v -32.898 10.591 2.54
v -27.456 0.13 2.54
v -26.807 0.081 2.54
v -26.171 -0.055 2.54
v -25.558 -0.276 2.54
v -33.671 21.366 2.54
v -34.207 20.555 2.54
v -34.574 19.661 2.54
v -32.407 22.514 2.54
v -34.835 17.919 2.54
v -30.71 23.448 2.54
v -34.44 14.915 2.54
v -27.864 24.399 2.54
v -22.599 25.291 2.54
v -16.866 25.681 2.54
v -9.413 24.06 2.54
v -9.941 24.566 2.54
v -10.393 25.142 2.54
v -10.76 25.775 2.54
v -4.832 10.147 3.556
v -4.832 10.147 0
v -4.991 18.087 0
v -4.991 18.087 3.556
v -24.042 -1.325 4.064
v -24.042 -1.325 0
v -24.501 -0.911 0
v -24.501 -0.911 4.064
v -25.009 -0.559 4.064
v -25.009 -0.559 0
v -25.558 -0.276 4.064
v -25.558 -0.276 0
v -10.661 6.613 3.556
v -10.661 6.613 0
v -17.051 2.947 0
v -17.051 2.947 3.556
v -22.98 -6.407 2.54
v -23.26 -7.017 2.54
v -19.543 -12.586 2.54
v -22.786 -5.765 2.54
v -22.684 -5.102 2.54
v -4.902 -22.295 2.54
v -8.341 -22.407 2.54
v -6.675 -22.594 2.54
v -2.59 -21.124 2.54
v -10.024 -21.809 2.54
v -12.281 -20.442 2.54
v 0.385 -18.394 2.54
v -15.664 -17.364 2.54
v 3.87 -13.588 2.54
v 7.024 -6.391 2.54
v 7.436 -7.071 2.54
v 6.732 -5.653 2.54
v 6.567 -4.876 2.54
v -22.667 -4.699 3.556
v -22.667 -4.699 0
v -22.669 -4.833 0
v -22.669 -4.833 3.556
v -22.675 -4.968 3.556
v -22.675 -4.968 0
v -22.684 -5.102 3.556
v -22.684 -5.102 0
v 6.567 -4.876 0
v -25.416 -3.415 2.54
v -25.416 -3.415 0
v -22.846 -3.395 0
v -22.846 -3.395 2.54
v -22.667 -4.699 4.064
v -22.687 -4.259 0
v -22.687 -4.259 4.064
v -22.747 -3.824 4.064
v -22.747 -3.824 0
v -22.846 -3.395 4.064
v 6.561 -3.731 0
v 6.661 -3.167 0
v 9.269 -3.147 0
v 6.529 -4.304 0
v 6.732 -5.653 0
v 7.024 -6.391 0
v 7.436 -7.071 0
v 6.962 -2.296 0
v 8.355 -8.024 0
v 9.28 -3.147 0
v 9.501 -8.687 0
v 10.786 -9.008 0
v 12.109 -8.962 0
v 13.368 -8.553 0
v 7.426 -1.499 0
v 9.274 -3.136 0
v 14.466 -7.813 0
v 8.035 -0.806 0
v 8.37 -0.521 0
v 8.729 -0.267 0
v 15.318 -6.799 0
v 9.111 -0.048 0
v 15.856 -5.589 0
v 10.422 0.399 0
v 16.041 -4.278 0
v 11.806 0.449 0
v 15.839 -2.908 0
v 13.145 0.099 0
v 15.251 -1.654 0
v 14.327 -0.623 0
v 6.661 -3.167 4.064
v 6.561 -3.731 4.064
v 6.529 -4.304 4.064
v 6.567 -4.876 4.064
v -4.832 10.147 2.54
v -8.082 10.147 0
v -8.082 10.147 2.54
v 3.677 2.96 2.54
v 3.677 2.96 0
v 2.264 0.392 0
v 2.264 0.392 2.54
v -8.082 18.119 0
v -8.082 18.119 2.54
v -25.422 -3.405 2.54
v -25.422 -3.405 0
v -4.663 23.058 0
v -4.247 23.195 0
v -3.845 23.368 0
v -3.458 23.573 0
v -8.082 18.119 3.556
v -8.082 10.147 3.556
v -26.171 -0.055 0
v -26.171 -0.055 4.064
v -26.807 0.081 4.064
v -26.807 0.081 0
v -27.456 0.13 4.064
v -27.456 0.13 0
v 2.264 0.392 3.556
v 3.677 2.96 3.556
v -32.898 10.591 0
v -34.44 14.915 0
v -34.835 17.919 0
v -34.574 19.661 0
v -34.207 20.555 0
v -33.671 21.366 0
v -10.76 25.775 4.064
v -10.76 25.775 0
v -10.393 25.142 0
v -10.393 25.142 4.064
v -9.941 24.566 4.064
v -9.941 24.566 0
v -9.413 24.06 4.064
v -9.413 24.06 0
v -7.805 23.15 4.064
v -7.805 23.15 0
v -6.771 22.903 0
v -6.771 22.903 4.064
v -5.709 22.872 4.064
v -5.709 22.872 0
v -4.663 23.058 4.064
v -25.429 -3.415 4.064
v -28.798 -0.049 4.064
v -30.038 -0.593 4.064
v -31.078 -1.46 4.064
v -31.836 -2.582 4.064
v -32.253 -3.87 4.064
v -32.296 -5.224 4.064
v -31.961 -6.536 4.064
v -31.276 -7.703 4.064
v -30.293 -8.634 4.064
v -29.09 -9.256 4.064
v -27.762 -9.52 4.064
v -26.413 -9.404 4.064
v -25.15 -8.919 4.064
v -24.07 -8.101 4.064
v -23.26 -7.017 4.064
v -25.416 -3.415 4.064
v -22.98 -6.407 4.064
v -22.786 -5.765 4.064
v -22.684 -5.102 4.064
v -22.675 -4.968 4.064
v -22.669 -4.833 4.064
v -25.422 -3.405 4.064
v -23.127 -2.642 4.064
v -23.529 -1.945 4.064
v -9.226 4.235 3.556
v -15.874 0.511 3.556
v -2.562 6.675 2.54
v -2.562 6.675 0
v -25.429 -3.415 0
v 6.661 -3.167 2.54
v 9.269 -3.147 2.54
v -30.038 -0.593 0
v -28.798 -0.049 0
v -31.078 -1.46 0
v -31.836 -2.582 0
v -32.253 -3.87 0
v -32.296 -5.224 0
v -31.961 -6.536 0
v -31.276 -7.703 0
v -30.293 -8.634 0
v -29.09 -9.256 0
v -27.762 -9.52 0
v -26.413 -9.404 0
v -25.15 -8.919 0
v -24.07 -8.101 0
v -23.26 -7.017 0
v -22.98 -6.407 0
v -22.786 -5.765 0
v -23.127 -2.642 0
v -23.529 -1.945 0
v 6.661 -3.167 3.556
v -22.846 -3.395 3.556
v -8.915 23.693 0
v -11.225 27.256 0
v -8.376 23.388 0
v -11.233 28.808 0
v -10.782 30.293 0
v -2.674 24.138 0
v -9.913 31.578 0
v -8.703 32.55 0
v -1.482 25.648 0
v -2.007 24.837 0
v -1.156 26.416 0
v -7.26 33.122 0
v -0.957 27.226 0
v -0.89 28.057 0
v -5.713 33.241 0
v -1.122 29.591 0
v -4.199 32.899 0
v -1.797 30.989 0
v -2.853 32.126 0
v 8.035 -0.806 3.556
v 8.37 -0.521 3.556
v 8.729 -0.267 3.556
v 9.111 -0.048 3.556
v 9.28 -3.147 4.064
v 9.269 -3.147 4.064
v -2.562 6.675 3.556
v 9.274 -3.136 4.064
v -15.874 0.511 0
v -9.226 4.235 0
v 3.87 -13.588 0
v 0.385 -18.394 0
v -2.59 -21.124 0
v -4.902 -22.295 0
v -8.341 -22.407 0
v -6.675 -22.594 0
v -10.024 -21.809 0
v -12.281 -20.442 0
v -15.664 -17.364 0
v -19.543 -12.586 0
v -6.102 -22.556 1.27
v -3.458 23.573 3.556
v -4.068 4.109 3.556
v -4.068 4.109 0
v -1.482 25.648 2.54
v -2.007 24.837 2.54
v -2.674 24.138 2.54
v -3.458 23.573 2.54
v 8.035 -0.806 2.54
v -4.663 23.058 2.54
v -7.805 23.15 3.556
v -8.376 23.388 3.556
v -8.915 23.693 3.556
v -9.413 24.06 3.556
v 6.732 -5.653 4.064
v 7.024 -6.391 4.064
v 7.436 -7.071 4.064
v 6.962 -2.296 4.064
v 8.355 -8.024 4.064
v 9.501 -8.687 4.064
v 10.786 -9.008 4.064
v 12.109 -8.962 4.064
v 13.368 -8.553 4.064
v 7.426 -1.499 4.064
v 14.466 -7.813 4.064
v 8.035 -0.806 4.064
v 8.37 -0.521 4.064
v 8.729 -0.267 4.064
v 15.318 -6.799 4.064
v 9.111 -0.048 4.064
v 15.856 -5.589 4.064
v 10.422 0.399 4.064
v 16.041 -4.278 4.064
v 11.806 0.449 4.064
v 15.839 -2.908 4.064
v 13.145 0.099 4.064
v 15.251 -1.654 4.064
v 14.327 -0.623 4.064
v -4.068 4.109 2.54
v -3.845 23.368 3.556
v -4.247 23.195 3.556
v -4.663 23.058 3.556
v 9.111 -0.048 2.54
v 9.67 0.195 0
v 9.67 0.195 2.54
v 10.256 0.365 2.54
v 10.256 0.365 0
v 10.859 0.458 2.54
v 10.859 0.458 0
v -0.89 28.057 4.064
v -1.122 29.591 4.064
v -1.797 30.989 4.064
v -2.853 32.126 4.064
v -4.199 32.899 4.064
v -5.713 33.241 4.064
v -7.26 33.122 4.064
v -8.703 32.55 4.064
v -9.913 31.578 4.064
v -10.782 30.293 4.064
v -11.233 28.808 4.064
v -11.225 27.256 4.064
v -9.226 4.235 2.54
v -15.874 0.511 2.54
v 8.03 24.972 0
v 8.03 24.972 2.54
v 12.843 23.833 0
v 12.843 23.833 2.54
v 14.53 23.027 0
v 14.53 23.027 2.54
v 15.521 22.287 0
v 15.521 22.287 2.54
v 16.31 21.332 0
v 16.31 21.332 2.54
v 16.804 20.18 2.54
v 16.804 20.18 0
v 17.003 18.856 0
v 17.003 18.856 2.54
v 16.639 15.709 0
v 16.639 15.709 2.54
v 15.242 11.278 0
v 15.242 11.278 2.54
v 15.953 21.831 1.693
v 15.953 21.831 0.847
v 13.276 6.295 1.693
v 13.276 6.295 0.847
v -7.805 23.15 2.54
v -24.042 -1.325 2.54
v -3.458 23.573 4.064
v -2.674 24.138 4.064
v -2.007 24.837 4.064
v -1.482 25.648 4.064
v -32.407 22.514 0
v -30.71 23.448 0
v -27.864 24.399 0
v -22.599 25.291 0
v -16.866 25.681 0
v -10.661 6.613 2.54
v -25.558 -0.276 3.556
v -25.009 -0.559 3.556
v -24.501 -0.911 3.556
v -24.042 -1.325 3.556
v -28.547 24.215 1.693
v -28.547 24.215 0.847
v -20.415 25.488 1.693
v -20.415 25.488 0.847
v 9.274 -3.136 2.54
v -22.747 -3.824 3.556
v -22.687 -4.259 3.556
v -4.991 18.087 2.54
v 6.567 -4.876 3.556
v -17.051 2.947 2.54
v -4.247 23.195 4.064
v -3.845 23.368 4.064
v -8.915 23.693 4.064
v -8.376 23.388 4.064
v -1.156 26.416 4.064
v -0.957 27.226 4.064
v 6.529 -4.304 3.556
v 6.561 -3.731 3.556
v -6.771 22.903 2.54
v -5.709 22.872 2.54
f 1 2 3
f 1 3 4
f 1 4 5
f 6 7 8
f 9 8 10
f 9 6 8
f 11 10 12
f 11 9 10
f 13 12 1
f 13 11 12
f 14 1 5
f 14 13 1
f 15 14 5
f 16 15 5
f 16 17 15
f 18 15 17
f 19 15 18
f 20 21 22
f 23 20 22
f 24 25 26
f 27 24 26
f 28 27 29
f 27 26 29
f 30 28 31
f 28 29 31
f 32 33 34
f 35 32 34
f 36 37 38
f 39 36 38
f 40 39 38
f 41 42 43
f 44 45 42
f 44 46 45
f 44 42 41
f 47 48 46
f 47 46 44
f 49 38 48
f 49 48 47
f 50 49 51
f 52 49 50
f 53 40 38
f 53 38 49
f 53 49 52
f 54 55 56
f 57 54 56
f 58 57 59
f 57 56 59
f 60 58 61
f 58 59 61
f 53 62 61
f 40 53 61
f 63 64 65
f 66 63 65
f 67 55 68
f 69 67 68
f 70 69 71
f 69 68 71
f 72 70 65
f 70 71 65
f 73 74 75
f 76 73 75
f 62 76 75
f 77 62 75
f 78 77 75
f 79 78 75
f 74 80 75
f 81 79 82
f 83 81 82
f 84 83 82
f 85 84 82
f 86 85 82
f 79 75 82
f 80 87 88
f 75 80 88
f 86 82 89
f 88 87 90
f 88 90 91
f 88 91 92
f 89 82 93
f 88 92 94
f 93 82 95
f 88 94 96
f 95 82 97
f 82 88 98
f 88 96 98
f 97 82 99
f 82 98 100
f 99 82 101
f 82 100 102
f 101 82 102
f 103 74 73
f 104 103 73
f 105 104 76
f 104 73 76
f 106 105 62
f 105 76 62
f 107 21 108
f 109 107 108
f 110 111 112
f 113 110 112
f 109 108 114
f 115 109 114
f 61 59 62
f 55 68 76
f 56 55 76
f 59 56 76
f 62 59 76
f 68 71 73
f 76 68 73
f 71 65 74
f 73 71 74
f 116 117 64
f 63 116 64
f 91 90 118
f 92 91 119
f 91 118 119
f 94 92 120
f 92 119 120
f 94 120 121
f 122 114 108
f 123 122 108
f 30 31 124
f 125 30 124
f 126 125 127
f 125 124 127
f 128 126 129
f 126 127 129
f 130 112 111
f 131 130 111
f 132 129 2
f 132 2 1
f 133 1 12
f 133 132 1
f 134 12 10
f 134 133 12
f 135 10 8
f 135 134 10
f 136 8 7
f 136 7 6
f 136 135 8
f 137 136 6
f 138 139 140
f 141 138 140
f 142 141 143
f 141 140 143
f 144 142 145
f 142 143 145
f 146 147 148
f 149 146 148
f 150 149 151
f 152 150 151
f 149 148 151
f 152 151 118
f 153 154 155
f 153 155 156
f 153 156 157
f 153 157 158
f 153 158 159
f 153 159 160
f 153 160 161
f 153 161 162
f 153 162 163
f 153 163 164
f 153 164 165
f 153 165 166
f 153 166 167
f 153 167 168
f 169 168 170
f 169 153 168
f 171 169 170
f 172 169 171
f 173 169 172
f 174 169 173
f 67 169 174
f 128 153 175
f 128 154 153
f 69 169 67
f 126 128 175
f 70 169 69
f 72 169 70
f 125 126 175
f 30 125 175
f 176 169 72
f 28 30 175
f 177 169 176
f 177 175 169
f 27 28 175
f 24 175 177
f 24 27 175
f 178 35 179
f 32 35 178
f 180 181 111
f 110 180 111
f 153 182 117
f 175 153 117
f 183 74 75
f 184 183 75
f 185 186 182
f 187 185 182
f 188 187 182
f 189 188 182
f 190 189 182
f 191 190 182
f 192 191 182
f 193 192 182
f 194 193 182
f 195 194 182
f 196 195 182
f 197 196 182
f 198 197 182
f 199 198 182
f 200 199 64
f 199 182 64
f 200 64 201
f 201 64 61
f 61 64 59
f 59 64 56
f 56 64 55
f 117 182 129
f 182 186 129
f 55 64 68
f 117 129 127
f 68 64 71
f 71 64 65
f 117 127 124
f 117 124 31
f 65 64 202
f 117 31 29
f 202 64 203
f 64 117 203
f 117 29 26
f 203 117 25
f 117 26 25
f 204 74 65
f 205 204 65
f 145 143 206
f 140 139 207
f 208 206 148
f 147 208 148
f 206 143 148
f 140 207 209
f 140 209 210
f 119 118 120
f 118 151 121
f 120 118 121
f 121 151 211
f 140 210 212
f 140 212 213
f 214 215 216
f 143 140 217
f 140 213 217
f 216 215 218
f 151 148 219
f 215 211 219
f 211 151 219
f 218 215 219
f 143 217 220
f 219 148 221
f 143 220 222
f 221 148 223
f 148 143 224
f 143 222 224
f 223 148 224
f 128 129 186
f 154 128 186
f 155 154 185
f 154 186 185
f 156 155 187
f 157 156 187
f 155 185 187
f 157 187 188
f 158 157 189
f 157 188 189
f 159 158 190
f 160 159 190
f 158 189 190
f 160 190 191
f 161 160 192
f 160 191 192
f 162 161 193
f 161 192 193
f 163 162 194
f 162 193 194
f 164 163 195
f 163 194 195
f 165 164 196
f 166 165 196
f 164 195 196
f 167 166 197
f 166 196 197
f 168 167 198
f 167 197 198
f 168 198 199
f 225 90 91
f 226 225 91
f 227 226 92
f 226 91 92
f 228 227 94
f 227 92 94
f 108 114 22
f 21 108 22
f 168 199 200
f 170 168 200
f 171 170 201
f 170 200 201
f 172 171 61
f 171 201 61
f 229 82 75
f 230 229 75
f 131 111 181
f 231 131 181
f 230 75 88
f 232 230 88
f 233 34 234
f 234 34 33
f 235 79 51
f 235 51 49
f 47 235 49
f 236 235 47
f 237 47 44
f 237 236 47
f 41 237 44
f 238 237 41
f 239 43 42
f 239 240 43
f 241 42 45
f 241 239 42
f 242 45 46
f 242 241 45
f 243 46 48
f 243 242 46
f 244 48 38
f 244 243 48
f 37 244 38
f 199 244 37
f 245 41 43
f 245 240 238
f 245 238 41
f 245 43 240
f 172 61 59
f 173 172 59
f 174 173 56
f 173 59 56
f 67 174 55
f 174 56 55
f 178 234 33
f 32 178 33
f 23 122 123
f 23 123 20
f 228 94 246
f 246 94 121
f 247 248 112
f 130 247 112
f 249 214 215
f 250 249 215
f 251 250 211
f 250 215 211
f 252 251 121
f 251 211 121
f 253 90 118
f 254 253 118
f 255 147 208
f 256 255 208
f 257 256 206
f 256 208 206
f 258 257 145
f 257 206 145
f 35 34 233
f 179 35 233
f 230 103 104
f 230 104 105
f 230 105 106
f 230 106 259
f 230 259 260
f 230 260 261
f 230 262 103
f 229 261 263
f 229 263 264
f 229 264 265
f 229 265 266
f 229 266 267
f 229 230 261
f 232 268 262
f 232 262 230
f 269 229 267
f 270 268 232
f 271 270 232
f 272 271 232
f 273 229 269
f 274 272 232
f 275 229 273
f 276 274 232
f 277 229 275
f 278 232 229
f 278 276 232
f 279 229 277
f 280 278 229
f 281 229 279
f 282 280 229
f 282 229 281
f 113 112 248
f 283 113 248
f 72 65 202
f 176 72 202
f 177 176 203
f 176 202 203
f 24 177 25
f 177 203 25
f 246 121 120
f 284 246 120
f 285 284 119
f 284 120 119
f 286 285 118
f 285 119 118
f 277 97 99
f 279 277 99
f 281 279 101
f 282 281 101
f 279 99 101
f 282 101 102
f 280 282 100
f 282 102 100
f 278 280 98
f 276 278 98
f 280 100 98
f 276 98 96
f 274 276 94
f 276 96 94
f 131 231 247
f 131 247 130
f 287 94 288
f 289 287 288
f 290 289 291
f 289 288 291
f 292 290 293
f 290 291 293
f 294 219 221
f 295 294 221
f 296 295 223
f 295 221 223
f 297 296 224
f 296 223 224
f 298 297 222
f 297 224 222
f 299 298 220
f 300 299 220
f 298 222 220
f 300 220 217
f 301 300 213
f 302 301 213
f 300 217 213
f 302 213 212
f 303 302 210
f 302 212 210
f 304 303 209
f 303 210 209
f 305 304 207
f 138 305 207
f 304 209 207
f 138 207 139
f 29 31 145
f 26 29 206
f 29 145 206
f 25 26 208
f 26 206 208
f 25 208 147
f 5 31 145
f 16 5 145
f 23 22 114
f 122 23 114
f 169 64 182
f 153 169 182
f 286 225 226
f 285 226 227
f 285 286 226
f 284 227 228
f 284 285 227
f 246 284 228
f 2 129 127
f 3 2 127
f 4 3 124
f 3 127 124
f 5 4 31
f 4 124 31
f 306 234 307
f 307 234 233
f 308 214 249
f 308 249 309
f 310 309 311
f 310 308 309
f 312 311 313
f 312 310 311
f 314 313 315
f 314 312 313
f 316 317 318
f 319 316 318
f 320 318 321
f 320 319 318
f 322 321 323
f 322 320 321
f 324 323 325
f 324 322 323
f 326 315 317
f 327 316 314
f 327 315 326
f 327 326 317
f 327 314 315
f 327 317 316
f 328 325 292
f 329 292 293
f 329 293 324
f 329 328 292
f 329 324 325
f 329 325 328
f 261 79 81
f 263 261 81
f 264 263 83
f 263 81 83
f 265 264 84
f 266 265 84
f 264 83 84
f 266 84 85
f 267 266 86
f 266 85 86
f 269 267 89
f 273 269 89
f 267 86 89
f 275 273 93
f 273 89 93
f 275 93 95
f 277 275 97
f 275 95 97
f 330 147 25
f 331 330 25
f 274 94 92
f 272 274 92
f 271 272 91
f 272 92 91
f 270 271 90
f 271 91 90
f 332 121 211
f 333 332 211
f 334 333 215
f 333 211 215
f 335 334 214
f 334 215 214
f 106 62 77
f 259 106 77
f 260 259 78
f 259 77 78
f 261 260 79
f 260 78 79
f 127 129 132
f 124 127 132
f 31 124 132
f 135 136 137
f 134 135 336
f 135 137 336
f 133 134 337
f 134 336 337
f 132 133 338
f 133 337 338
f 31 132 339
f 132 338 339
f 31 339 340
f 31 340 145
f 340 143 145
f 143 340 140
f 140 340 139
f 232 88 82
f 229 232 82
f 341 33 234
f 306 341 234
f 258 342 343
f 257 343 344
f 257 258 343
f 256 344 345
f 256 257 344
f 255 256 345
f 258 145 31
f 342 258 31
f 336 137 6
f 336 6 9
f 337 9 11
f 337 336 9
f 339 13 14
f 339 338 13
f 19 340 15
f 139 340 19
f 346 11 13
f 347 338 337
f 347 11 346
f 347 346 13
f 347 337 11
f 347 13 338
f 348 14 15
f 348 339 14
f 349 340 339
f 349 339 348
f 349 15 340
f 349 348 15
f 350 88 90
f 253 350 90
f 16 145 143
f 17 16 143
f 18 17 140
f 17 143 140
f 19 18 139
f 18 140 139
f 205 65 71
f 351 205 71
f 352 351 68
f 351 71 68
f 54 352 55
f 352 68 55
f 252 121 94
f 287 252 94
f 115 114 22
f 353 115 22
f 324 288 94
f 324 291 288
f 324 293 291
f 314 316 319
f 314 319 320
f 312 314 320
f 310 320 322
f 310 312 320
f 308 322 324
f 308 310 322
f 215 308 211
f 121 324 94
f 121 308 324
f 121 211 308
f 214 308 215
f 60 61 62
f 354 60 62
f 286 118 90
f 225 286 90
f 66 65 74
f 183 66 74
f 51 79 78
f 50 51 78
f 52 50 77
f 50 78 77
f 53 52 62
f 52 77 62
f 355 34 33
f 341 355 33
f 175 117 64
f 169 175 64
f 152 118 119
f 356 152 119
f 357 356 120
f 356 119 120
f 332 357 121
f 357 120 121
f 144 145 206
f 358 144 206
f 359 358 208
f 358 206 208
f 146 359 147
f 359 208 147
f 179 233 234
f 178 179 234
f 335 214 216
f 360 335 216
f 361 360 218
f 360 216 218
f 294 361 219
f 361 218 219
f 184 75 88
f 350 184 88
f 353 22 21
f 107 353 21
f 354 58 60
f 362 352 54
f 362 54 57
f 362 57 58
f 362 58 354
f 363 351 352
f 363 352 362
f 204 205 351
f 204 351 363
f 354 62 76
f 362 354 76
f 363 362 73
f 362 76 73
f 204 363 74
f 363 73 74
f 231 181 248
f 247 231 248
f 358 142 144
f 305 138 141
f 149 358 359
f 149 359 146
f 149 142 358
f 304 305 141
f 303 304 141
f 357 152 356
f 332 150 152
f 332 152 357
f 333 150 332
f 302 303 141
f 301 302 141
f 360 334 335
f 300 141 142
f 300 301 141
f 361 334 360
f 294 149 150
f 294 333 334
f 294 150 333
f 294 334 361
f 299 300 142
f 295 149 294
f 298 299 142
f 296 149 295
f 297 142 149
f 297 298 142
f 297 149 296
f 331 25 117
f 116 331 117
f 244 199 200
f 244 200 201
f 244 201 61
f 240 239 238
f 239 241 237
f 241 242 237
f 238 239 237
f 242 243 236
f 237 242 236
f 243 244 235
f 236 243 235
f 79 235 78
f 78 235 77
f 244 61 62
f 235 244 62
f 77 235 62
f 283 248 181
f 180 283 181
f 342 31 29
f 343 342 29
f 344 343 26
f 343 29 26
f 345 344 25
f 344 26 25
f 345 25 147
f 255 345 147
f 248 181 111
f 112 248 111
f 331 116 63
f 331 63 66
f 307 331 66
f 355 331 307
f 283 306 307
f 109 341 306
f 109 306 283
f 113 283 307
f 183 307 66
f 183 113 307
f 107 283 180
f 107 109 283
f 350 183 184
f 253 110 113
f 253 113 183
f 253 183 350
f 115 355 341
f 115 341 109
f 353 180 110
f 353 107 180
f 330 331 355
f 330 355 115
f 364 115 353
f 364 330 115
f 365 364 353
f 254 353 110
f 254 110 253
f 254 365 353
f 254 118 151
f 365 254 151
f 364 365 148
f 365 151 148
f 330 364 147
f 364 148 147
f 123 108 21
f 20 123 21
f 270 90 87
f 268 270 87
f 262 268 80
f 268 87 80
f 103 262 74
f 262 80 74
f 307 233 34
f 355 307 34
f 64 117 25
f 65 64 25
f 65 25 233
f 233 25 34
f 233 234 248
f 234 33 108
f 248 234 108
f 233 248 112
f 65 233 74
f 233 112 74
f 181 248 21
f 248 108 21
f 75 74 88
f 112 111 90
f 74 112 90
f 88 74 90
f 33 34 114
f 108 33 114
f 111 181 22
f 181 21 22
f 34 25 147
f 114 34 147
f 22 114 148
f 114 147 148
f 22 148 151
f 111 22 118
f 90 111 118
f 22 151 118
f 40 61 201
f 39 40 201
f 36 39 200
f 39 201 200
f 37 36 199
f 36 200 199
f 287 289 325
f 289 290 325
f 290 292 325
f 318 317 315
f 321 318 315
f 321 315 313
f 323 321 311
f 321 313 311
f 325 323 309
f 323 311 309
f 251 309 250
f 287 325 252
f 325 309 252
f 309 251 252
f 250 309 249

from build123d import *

# Parameters (mm, degrees)
F1_DEPTH = 2.54
F2_DEPTH = 3.556
F3_DEPTH = 4.064


with BuildPart() as f1:
    # F0 (on Top) → F1 (new body)
    with BuildSketch(Plane.XY):
        with BuildLine():
            ThreePointArc((-4.6630981009, 23.0576099927), (-6.2409645721, 22.860472595), (-7.8046054884, 23.1495276747))
            Line((-7.8046054884, 23.1495276747), (-24.0416144553, -1.3245914444))
            ThreePointArc((-24.0416144553, -1.3245914444), (-23.3138138733, -2.2848777795), (-22.8464301162, -3.3954613901))
            Line((-22.8464301162, -3.3954613901), (6.6606822161, -3.1671756941))
            ThreePointArc((6.6606822161, -3.1671756941), (7.1745992451, -1.8858915335), (8.0348610996, -0.8061928003))
            Line((8.0348610996, -0.8061928003), (-4.6630981009, 23.0576099927))
        make_face()
        Polygon((-15.8743415506, 0.51123949), (-17.0506863953, 2.947188482), (-10.6613747776, 6.6125662997), (-9.2262719276, 4.2351581635), align=None, mode=Mode.SUBTRACT)
        Polygon((-4.0678573438, 4.1093348098), (-2.5615811887, 6.6748808586), (3.6771709565, 2.9596772511), (2.264362858, 0.3915795571), align=None, mode=Mode.SUBTRACT)
        Polygon((-8.0818189308, 10.1467873901), (-8.0818189308, 18.1188309025), (-4.9913643151, 18.0870166502), (-4.8323459923, 10.1467873901), align=None, mode=Mode.SUBTRACT)
        with BuildLine():
            Line((9.2744107453, -3.1357299984), (8.0348610996, -0.8061928003))
            ThreePointArc((8.0348610996, -0.8061928003), (7.1745992451, -1.8858915335), (6.6606822161, -3.1671756941))
            Line((6.6606822161, -3.1671756941), (9.2693157423, -3.1469936542))
            Line((9.2693157423, -3.1469936542), (9.2744107453, -3.1357299984))
        make_face()
        with BuildLine():
            ThreePointArc((-22.8464301162, -3.3954613901), (-23.3138138733, -2.2848777795), (-24.0416144553, -1.3245914444))
            Line((-24.0416144553, -1.3245914444), (-25.4220212793, -3.4052850691))
            Line((-25.4220212793, -3.4052850691), (-25.4161386089, -3.4153422814))
            Line((-25.4161386089, -3.4153422814), (-22.8464301162, -3.3954613901))
        make_face()
    extrude(amount=F1_DEPTH)


with BuildPart() as f1b:
    # F0 (on Top) → F1, piece 2 (new body)
    with BuildSketch(Plane.XY):
        with BuildLine():
            add(Edge.make_bspline(
                [(-1.4819762816, 25.6484124624), (6.6986011106, 25.4239870709), (20.3462642446, 24.0615429755), (15.8700444117, 12.6322818513), (11.7234724765, 2.4879806788), (10.8586227713, 0.4584006141)],
                knots=[0.1997317172, 0.1997317172, 0.1997317172, 0.1997317172, 0.3324978777, 0.4643106101, 0.4962019436, 0.4962019436, 0.4962019436, 0.4962019436], degree=3))
            ThreePointArc((-1.4819762816, 25.6484124624), (-2.3241219854, 24.471995484), (-3.457875844, 23.5732360714))
            Line((-3.457875844, 23.5732360714), (9.1111597711, -0.0482752659))
            ThreePointArc((9.1111597711, -0.0482752659), (9.9604350443, 0.2894092027), (10.8586227713, 0.4584006141))
        make_face()
    extrude(amount=F1_DEPTH)


with BuildPart() as f1c:
    # F0 (on Top) → F1, piece 3 (new body)
    with BuildSketch(Plane.XY):
        with BuildLine():
            ThreePointArc((-22.6841610167, -5.1018859941), (-22.8719423093, -6.0893979217), (-23.2601161425, -7.0166318167))
            add(Edge.make_bspline(
                [(7.4355185476, -7.0710028411), (3.5438886247, -14.9808993579), (-6.3714566512, -29.9304237376), (-17.9340153002, -15.5761614263), (-23.2601161425, -7.0166318167)],
                knots=[0.535267871, 0.535267871, 0.535267871, 0.535267871, 0.6600193188, 0.8017052217, 0.8017052217, 0.8017052217, 0.8017052217], degree=3))
            ThreePointArc((7.4355185476, -7.0710028411), (6.8627279114, -6.02806372), (6.566758563, -4.8755823674))
            Line((6.566758563, -4.8755823674), (-22.6841610167, -5.1018859941))
        make_face()
    extrude(amount=F1_DEPTH)


with BuildPart() as f1d:
    # F0 (on Top) → F1, piece 4 (new body)
    with BuildSketch(Plane.XY):
        with BuildLine():
            ThreePointArc((-9.413243583, 24.0601013281), (-10.1774941911, 24.846172121), (-10.7598903606, 25.7750429329))
            add(Edge.make_bspline(
                [(-33.6705009619, 21.3656310089), (-30.5455731412, 25.1995157512), (-20.6823038995, 25.7850214095), (-10.7598903606, 25.7750429329)],
                knots=[0, 0, 0, 0, 0.1515402513, 0.1515402513, 0.1515402513, 0.1515402513], degree=3))
            add(Edge.make_bspline(
                [(-27.4563565011, 0.12991348), (-27.8161971008, 0.771396026), (-33.0793394315, 10.2381580049), (-36.7326552198, 17.6087613589), (-33.6705009619, 21.3656310089)],
                knots=[0.8408235096, 0.8408235096, 0.8408235096, 0.8408235096, 0.8515038899, 1, 1, 1, 1], degree=3))
            ThreePointArc((-27.4563565011, 0.12991348), (-26.4868209399, 0.0234643115), (-25.5584577312, -0.2756550339))
            Line((-25.5584577312, -0.2756550339), (-9.413243583, 24.0601013281))
        make_face()
    extrude(amount=F1_DEPTH)


with BuildPart() as f2:
    # F0 (on Top) → F2 (new body)
    with BuildSketch(Plane.XY):
        with BuildLine():
            ThreePointArc((-7.8046054884, 23.1495276747), (-8.6497225296, 23.5327399286), (-9.413243583, 24.0601013281))
            Line((-9.413243583, 24.0601013281), (-25.5584577312, -0.2756550339))
            ThreePointArc((-25.5584577312, -0.2756550339), (-24.7494930119, -0.7270340296), (-24.0416144553, -1.3245914444))
            Line((-24.0416144553, -1.3245914444), (-7.8046054884, 23.1495276747))
        make_face()
    extrude(amount=F2_DEPTH)


with BuildPart() as f2b:
    # F0 (on Top) → F2, piece 2 (new body)
    with BuildSketch(Plane.XY):
        with BuildLine():
            ThreePointArc((-3.457875844, 23.5732360714), (-4.044168706, 23.2772807838), (-4.6630981009, 23.0576099927))
            Line((-4.6630981009, 23.0576099927), (8.0348610996, -0.8061928003))
            ThreePointArc((8.0348610996, -0.8061928003), (8.5466597389, -0.3898141051), (9.1111597711, -0.0482752659))
            Line((9.1111597711, -0.0482752659), (-3.457875844, 23.5732360714))
        make_face()
    extrude(amount=F2_DEPTH)


with BuildPart() as f2c:
    # F0 (on Top) → F2, piece 3 (new body)
    with BuildSketch(Plane.XY):
        with BuildLine():
            Line((6.6606822161, -3.1671756941), (-22.8464301162, -3.3954613901))
            ThreePointArc((-22.8464301162, -3.3954613901), (-22.7122797835, -4.0408617349), (-22.6672834673, -4.6985191293))
            ThreePointArc((-22.6672834673, -4.6985191293), (-22.6715046998, -4.9003790308), (-22.6841610167, -5.1018859941))
            Line((-22.6841610167, -5.1018859941), (6.566758563, -4.8755823674))
            ThreePointArc((6.566758563, -4.8755823674), (6.5362584152, -4.0171203775), (6.6606822161, -3.1671756941))
        make_face()
    extrude(amount=F2_DEPTH)


with BuildPart() as f2d:
    # F0 (on Top) → F2, piece 4 (new body)
    with BuildSketch(Plane.XY):
        Polygon((-4.9913643151, 18.0870166502), (-8.0818189308, 18.1188309025), (-8.0818189308, 10.1467873901), (-4.8323459923, 10.1467873901), align=None)
    extrude(amount=F2_DEPTH)


with BuildPart() as f2e:
    # F0 (on Top) → F2, piece 5 (new body)
    with BuildSketch(Plane.XY):
        Polygon((3.6771709565, 2.9596772511), (-2.5615811887, 6.6748808586), (-4.0678573438, 4.1093348098), (2.264362858, 0.3915795571), align=None)
    extrude(amount=F2_DEPTH)


with BuildPart() as f2f:
    # F0 (on Top) → F2, piece 6 (new body)
    with BuildSketch(Plane.XY):
        Polygon((-10.6613747776, 6.6125662997), (-17.0506863953, 2.947188482), (-15.8743415506, 0.51123949), (-9.2262719276, 4.2351581635), align=None)
    extrude(amount=F2_DEPTH)


with BuildPart() as f3:
    # F0 (on Top) → F3 (new body)
    with BuildSketch(Plane.XY):
        with BuildLine():
            add(Edge.make_bspline(
                [(-10.7598903606, 25.7750429329), (-9.9338328656, 25.7742122081), (-9.107365451, 25.7692542777), (-8.2843420404, 25.7616998728)],
                knots=[0.1515402513, 0.1515402513, 0.1515402513, 0.1515402513, 0.1641562302, 0.1641562302, 0.1641562302, 0.1641562302], degree=3))
            add(Edge.make_bspline(
                [(-8.2843420404, 25.7616998728), (-7.5487056314, 25.7549475798), (-6.8158206983, 25.7461209173), (-6.0884392904, 25.7363129654)],
                knots=[0.1641562302, 0.1641562302, 0.1641562302, 0.1641562302, 0.1754326694, 0.1754326694, 0.1754326694, 0.1754326694], degree=3))
            add(Edge.make_bspline(
                [(-6.0884392904, 25.7363129654), (-4.5210406381, 25.7151782893), (-2.979196963, 25.6894871105), (-1.4819762816, 25.6484124624)],
                knots=[0.1754326694, 0.1754326694, 0.1754326694, 0.1754326694, 0.1997317172, 0.1997317172, 0.1997317172, 0.1997317172], degree=3))
            ThreePointArc((-1.4819762816, 25.6484124624), (-1.0405225547, 26.8167654572), (-0.8904843638, 28.056692332))
            ThreePointArc((-0.8904843638, 28.056692332), (-7.2598420446, 33.121549159), (-10.7598903606, 25.7750429329))
        make_face()
        with BuildLine():
            add(Edge.make_bspline(
                [(-6.0884392904, 25.7363129654), (-4.5210406381, 25.7151782893), (-2.979196963, 25.6894871105), (-1.4819762816, 25.6484124624)],
                knots=[0.1754326694, 0.1754326694, 0.1754326694, 0.1754326694, 0.1997317172, 0.1997317172, 0.1997317172, 0.1997317172], degree=3))
            Line((-6.0884392904, 25.7363129654), (-4.6630981009, 23.0576099927))
            ThreePointArc((-4.6630981009, 23.0576099927), (-4.044168706, 23.2772807838), (-3.457875844, 23.5732360714))
            ThreePointArc((-3.457875844, 23.5732360714), (-2.3241219854, 24.471995484), (-1.4819762816, 25.6484124624))
        make_face()
        with BuildLine():
            add(Edge.make_bspline(
                [(-8.2843420404, 25.7616998728), (-7.5487056314, 25.7549475798), (-6.8158206983, 25.7461209173), (-6.0884392904, 25.7363129654)],
                knots=[0.1641562302, 0.1641562302, 0.1641562302, 0.1641562302, 0.1754326694, 0.1754326694, 0.1754326694, 0.1754326694], degree=3))
            Line((-8.2843420404, 25.7616998728), (-9.413243583, 24.0601013281))
            ThreePointArc((-9.413243583, 24.0601013281), (-8.6497225296, 23.5327399286), (-7.8046054884, 23.1495276747))
            Line((-7.8046054884, 23.1495276747), (-6.0884392904, 25.7363129654))
        make_face()
        with BuildLine():
            Line((-9.413243583, 24.0601013281), (-8.2843420404, 25.7616998728))
            add(Edge.make_bspline(
                [(-10.7598903606, 25.7750429329), (-9.9338328656, 25.7742122081), (-9.107365451, 25.7692542777), (-8.2843420404, 25.7616998728)],
                knots=[0.1515402513, 0.1515402513, 0.1515402513, 0.1515402513, 0.1641562302, 0.1641562302, 0.1641562302, 0.1641562302], degree=3))
            ThreePointArc((-10.7598903606, 25.7750429329), (-10.1774941911, 24.846172121), (-9.413243583, 24.0601013281))
        make_face()
        with BuildLine():
            Line((-4.6630981009, 23.0576099927), (-6.0884392904, 25.7363129654))
            Line((-6.0884392904, 25.7363129654), (-7.8046054884, 23.1495276747))
            ThreePointArc((-7.8046054884, 23.1495276747), (-6.2409645721, 22.860472595), (-4.6630981009, 23.0576099927))
        make_face()
    extrude(amount=F3_DEPTH)


with BuildPart() as f3b:
    # F0 (on Top) → F3, piece 2 (new body)
    with BuildSketch(Plane.XY):
        with BuildLine():
            ThreePointArc((16.040523848, -4.2781828726), (14.4933917754, -0.7679363751), (10.8586227713, 0.4584006141))
            add(Edge.make_bspline(
                [(10.8586227713, 0.4584006141), (10.5637178642, -0.2336654371), (10.2621792483, -0.9319358482), (9.9542651309, -1.6327582306)],
                knots=[0.4962019436, 0.4962019436, 0.4962019436, 0.4962019436, 0.5070765622, 0.5070765622, 0.5070765622, 0.5070765622], degree=3))
            add(Edge.make_bspline(
                [(9.9542651309, -1.6327582306), (9.7328930129, -2.1366082535), (9.5082255491, -2.6417773299), (9.2803586904, -3.1469082189)],
                knots=[0.5070765622, 0.5070765622, 0.5070765622, 0.5070765622, 0.5148947726, 0.5148947726, 0.5148947726, 0.5148947726], degree=3))
            add(Edge.make_bspline(
                [(9.2803586904, -3.1469082189), (9.0223449366, -3.7188681677), (8.7602292245, -4.2907791563), (8.4941508485, -4.8606708409)],
                knots=[0.5148947726, 0.5148947726, 0.5148947726, 0.5148947726, 0.523747336, 0.523747336, 0.523747336, 0.523747336], degree=3))
            add(Edge.make_bspline(
                [(8.4941508485, -4.8606708409), (8.1478821914, -5.6023155821), (7.794902423, -6.3405404588), (7.4355185476, -7.0710028411)],
                knots=[0.523747336, 0.523747336, 0.523747336, 0.523747336, 0.535267871, 0.535267871, 0.535267871, 0.535267871], degree=3))
            ThreePointArc((7.4355185476, -7.0710028411), (12.7529218904, -8.8016207134), (16.040523848, -4.2781828726))
        make_face()
        with BuildLine():
            add(Edge.make_bspline(
                [(10.8586227713, 0.4584006141), (10.5637178642, -0.2336654371), (10.2621792483, -0.9319358482), (9.9542651309, -1.6327582306)],
                knots=[0.4962019436, 0.4962019436, 0.4962019436, 0.4962019436, 0.5070765622, 0.5070765622, 0.5070765622, 0.5070765622], degree=3))
            ThreePointArc((10.8586227713, 0.4584006141), (9.9604350443, 0.2894092027), (9.1111597711, -0.0482752659))
            Line((9.1111597711, -0.0482752659), (9.9542651309, -1.6327582306))
        make_face()
        with BuildLine():
            ThreePointArc((9.1111597711, -0.0482752659), (8.5466597389, -0.3898141051), (8.0348610996, -0.8061928003))
            Line((8.0348610996, -0.8061928003), (9.2744107453, -3.1357299984))
            Line((9.2744107453, -3.1357299984), (9.9542651309, -1.6327582306))
            Line((9.9542651309, -1.6327582306), (9.1111597711, -0.0482752659))
        make_face()
        with BuildLine():
            Line((9.2744107453, -3.1357299984), (8.0348610996, -0.8061928003))
            ThreePointArc((8.0348610996, -0.8061928003), (7.1745992451, -1.8858915335), (6.6606822161, -3.1671756941))
            Line((6.6606822161, -3.1671756941), (9.2693157423, -3.1469936542))
            Line((9.2693157423, -3.1469936542), (9.2744107453, -3.1357299984))
        make_face()
        with BuildLine():
            Line((9.2693157423, -3.1469936542), (6.6606822161, -3.1671756941))
            ThreePointArc((6.6606822161, -3.1671756941), (6.5362584152, -4.0171203775), (6.566758563, -4.8755823674))
            Line((6.566758563, -4.8755823674), (8.4941508485, -4.8606708409))
            Line((8.4941508485, -4.8606708409), (9.2693157423, -3.1469936542))
        make_face()
        with BuildLine():
            ThreePointArc((6.566758563, -4.8755823674), (6.8627279114, -6.02806372), (7.4355185476, -7.0710028411))
            add(Edge.make_bspline(
                [(8.4941508485, -4.8606708409), (8.1478821914, -5.6023155821), (7.794902423, -6.3405404588), (7.4355185476, -7.0710028411)],
                knots=[0.523747336, 0.523747336, 0.523747336, 0.523747336, 0.535267871, 0.535267871, 0.535267871, 0.535267871], degree=3))
            Line((8.4941508485, -4.8606708409), (6.566758563, -4.8755823674))
        make_face()
        with BuildLine():
            add(Edge.make_bspline(
                [(9.2803586904, -3.1469082189), (9.0223449366, -3.7188681677), (8.7602292245, -4.2907791563), (8.4941508485, -4.8606708409)],
                knots=[0.5148947726, 0.5148947726, 0.5148947726, 0.5148947726, 0.523747336, 0.523747336, 0.523747336, 0.523747336], degree=3))
            Line((9.2803586904, -3.1469082189), (9.2693157423, -3.1469936542))
            Line((9.2693157423, -3.1469936542), (8.4941508485, -4.8606708409))
        make_face()
        with BuildLine():
            add(Edge.make_bspline(
                [(9.9542651309, -1.6327582306), (9.7328930129, -2.1366082535), (9.5082255491, -2.6417773299), (9.2803586904, -3.1469082189)],
                knots=[0.5070765622, 0.5070765622, 0.5070765622, 0.5070765622, 0.5148947726, 0.5148947726, 0.5148947726, 0.5148947726], degree=3))
            Line((9.9542651309, -1.6327582306), (9.2744107453, -3.1357299984))
            Line((9.2744107453, -3.1357299984), (9.2803586904, -3.1469082189))
        make_face()
    extrude(amount=F3_DEPTH)


with BuildPart() as f3c:
    # F0 (on Top) → F3, piece 3 (new body)
    with BuildSketch(Plane.XY):
        with BuildLine():
            add(Edge.make_bspline(
                [(-26.4588086965, -1.6327582306), (-26.7965816425, -1.0415865773), (-27.1292357806, -0.4532398186), (-27.4563565011, 0.12991348)],
                knots=[0.8311142836, 0.8311142836, 0.8311142836, 0.8311142836, 0.8408235096, 0.8408235096, 0.8408235096, 0.8408235096], degree=3))
            ThreePointArc((-27.4563565011, 0.12991348), (-31.6597448399, -7.1434188848), (-23.2601161425, -7.0166318167))
            add(Edge.make_bspline(
                [(-23.2601161425, -7.0166318167), (-23.6519614722, -6.3869006492), (-24.039354187, -5.7521561255), (-24.421781211, -5.1153293237)],
                knots=[0.8017052217, 0.8017052217, 0.8017052217, 0.8017052217, 0.8121291624, 0.8121291624, 0.8121291624, 0.8121291624], degree=3))
            add(Edge.make_bspline(
                [(-24.421781211, -5.1153293237), (-24.7614781399, -4.5496577178), (-25.0972570567, -3.9823431601), (-25.428758369, -3.4154399158)],
                knots=[0.8121291624, 0.8121291624, 0.8121291624, 0.8121291624, 0.8213883947, 0.8213883947, 0.8213883947, 0.8213883947], degree=3))
            add(Edge.make_bspline(
                [(-25.428758369, -3.4154399158), (-25.7769670388, -2.8199652758), (-26.120456064, -2.2249444536), (-26.4588086965, -1.6327582306)],
                knots=[0.8213883947, 0.8213883947, 0.8213883947, 0.8213883947, 0.8311142836, 0.8311142836, 0.8311142836, 0.8311142836], degree=3))
        make_face()
        with BuildLine():
            Line((-26.4588086965, -1.6327582306), (-25.5584577312, -0.2756550339))
            ThreePointArc((-25.5584577312, -0.2756550339), (-26.4868209399, 0.0234643115), (-27.4563565011, 0.12991348))
            add(Edge.make_bspline(
                [(-26.4588086965, -1.6327582306), (-26.7965816425, -1.0415865773), (-27.1292357806, -0.4532398186), (-27.4563565011, 0.12991348)],
                knots=[0.8311142836, 0.8311142836, 0.8311142836, 0.8311142836, 0.8408235096, 0.8408235096, 0.8408235096, 0.8408235096], degree=3))
        make_face()
        with BuildLine():
            ThreePointArc((-24.0416144553, -1.3245914444), (-24.7494930119, -0.7270340296), (-25.5584577312, -0.2756550339))
            Line((-25.5584577312, -0.2756550339), (-26.4588086965, -1.6327582306))
            Line((-26.4588086965, -1.6327582306), (-25.4220212793, -3.4052850691))
            Line((-25.4220212793, -3.4052850691), (-24.0416144553, -1.3245914444))
        make_face()
        with BuildLine():
            ThreePointArc((-22.8464301162, -3.3954613901), (-23.3138138733, -2.2848777795), (-24.0416144553, -1.3245914444))
            Line((-24.0416144553, -1.3245914444), (-25.4220212793, -3.4052850691))
            Line((-25.4220212793, -3.4052850691), (-25.4161386089, -3.4153422814))
            Line((-25.4161386089, -3.4153422814), (-22.8464301162, -3.3954613901))
        make_face()
        with BuildLine():
            ThreePointArc((-22.6672834673, -4.6985191293), (-22.7122797835, -4.0408617349), (-22.8464301162, -3.3954613901))
            Line((-22.8464301162, -3.3954613901), (-25.4161386089, -3.4153422814))
            Line((-25.4161386089, -3.4153422814), (-24.421781211, -5.1153293237))
            Line((-24.421781211, -5.1153293237), (-22.6841610167, -5.1018859941))
            ThreePointArc((-22.6841610167, -5.1018859941), (-22.6715046998, -4.9003790308), (-22.6672834673, -4.6985191293))
        make_face()
        with BuildLine():
            add(Edge.make_bspline(
                [(-23.2601161425, -7.0166318167), (-23.6519614722, -6.3869006492), (-24.039354187, -5.7521561255), (-24.421781211, -5.1153293237)],
                knots=[0.8017052217, 0.8017052217, 0.8017052217, 0.8017052217, 0.8121291624, 0.8121291624, 0.8121291624, 0.8121291624], degree=3))
            ThreePointArc((-23.2601161425, -7.0166318167), (-22.8719423093, -6.0893979217), (-22.6841610167, -5.1018859941))
            Line((-22.6841610167, -5.1018859941), (-24.421781211, -5.1153293237))
        make_face()
        with BuildLine():
            Line((-25.4220212793, -3.4052850691), (-26.4588086965, -1.6327582306))
            add(Edge.make_bspline(
                [(-25.428758369, -3.4154399158), (-25.7769670388, -2.8199652758), (-26.120456064, -2.2249444536), (-26.4588086965, -1.6327582306)],
                knots=[0.8213883947, 0.8213883947, 0.8213883947, 0.8213883947, 0.8311142836, 0.8311142836, 0.8311142836, 0.8311142836], degree=3))
            Line((-25.428758369, -3.4154399158), (-25.4220212793, -3.4052850691))
        make_face()
        with BuildLine():
            Line((-25.4161386089, -3.4153422814), (-25.428758369, -3.4154399158))
            add(Edge.make_bspline(
                [(-24.421781211, -5.1153293237), (-24.7614781399, -4.5496577178), (-25.0972570567, -3.9823431601), (-25.428758369, -3.4154399158)],
                knots=[0.8121291624, 0.8121291624, 0.8121291624, 0.8121291624, 0.8213883947, 0.8213883947, 0.8213883947, 0.8213883947], degree=3))
            Line((-24.421781211, -5.1153293237), (-25.4161386089, -3.4153422814))
        make_face()
    extrude(amount=F3_DEPTH)


solid = Compound([f1.part, f1b.part, f1c.part, f1d.part, f2.part, f2b.part, f2c.part, f2d.part, f2e.part, f2f.part, f3.part, f3b.part, f3c.part])
